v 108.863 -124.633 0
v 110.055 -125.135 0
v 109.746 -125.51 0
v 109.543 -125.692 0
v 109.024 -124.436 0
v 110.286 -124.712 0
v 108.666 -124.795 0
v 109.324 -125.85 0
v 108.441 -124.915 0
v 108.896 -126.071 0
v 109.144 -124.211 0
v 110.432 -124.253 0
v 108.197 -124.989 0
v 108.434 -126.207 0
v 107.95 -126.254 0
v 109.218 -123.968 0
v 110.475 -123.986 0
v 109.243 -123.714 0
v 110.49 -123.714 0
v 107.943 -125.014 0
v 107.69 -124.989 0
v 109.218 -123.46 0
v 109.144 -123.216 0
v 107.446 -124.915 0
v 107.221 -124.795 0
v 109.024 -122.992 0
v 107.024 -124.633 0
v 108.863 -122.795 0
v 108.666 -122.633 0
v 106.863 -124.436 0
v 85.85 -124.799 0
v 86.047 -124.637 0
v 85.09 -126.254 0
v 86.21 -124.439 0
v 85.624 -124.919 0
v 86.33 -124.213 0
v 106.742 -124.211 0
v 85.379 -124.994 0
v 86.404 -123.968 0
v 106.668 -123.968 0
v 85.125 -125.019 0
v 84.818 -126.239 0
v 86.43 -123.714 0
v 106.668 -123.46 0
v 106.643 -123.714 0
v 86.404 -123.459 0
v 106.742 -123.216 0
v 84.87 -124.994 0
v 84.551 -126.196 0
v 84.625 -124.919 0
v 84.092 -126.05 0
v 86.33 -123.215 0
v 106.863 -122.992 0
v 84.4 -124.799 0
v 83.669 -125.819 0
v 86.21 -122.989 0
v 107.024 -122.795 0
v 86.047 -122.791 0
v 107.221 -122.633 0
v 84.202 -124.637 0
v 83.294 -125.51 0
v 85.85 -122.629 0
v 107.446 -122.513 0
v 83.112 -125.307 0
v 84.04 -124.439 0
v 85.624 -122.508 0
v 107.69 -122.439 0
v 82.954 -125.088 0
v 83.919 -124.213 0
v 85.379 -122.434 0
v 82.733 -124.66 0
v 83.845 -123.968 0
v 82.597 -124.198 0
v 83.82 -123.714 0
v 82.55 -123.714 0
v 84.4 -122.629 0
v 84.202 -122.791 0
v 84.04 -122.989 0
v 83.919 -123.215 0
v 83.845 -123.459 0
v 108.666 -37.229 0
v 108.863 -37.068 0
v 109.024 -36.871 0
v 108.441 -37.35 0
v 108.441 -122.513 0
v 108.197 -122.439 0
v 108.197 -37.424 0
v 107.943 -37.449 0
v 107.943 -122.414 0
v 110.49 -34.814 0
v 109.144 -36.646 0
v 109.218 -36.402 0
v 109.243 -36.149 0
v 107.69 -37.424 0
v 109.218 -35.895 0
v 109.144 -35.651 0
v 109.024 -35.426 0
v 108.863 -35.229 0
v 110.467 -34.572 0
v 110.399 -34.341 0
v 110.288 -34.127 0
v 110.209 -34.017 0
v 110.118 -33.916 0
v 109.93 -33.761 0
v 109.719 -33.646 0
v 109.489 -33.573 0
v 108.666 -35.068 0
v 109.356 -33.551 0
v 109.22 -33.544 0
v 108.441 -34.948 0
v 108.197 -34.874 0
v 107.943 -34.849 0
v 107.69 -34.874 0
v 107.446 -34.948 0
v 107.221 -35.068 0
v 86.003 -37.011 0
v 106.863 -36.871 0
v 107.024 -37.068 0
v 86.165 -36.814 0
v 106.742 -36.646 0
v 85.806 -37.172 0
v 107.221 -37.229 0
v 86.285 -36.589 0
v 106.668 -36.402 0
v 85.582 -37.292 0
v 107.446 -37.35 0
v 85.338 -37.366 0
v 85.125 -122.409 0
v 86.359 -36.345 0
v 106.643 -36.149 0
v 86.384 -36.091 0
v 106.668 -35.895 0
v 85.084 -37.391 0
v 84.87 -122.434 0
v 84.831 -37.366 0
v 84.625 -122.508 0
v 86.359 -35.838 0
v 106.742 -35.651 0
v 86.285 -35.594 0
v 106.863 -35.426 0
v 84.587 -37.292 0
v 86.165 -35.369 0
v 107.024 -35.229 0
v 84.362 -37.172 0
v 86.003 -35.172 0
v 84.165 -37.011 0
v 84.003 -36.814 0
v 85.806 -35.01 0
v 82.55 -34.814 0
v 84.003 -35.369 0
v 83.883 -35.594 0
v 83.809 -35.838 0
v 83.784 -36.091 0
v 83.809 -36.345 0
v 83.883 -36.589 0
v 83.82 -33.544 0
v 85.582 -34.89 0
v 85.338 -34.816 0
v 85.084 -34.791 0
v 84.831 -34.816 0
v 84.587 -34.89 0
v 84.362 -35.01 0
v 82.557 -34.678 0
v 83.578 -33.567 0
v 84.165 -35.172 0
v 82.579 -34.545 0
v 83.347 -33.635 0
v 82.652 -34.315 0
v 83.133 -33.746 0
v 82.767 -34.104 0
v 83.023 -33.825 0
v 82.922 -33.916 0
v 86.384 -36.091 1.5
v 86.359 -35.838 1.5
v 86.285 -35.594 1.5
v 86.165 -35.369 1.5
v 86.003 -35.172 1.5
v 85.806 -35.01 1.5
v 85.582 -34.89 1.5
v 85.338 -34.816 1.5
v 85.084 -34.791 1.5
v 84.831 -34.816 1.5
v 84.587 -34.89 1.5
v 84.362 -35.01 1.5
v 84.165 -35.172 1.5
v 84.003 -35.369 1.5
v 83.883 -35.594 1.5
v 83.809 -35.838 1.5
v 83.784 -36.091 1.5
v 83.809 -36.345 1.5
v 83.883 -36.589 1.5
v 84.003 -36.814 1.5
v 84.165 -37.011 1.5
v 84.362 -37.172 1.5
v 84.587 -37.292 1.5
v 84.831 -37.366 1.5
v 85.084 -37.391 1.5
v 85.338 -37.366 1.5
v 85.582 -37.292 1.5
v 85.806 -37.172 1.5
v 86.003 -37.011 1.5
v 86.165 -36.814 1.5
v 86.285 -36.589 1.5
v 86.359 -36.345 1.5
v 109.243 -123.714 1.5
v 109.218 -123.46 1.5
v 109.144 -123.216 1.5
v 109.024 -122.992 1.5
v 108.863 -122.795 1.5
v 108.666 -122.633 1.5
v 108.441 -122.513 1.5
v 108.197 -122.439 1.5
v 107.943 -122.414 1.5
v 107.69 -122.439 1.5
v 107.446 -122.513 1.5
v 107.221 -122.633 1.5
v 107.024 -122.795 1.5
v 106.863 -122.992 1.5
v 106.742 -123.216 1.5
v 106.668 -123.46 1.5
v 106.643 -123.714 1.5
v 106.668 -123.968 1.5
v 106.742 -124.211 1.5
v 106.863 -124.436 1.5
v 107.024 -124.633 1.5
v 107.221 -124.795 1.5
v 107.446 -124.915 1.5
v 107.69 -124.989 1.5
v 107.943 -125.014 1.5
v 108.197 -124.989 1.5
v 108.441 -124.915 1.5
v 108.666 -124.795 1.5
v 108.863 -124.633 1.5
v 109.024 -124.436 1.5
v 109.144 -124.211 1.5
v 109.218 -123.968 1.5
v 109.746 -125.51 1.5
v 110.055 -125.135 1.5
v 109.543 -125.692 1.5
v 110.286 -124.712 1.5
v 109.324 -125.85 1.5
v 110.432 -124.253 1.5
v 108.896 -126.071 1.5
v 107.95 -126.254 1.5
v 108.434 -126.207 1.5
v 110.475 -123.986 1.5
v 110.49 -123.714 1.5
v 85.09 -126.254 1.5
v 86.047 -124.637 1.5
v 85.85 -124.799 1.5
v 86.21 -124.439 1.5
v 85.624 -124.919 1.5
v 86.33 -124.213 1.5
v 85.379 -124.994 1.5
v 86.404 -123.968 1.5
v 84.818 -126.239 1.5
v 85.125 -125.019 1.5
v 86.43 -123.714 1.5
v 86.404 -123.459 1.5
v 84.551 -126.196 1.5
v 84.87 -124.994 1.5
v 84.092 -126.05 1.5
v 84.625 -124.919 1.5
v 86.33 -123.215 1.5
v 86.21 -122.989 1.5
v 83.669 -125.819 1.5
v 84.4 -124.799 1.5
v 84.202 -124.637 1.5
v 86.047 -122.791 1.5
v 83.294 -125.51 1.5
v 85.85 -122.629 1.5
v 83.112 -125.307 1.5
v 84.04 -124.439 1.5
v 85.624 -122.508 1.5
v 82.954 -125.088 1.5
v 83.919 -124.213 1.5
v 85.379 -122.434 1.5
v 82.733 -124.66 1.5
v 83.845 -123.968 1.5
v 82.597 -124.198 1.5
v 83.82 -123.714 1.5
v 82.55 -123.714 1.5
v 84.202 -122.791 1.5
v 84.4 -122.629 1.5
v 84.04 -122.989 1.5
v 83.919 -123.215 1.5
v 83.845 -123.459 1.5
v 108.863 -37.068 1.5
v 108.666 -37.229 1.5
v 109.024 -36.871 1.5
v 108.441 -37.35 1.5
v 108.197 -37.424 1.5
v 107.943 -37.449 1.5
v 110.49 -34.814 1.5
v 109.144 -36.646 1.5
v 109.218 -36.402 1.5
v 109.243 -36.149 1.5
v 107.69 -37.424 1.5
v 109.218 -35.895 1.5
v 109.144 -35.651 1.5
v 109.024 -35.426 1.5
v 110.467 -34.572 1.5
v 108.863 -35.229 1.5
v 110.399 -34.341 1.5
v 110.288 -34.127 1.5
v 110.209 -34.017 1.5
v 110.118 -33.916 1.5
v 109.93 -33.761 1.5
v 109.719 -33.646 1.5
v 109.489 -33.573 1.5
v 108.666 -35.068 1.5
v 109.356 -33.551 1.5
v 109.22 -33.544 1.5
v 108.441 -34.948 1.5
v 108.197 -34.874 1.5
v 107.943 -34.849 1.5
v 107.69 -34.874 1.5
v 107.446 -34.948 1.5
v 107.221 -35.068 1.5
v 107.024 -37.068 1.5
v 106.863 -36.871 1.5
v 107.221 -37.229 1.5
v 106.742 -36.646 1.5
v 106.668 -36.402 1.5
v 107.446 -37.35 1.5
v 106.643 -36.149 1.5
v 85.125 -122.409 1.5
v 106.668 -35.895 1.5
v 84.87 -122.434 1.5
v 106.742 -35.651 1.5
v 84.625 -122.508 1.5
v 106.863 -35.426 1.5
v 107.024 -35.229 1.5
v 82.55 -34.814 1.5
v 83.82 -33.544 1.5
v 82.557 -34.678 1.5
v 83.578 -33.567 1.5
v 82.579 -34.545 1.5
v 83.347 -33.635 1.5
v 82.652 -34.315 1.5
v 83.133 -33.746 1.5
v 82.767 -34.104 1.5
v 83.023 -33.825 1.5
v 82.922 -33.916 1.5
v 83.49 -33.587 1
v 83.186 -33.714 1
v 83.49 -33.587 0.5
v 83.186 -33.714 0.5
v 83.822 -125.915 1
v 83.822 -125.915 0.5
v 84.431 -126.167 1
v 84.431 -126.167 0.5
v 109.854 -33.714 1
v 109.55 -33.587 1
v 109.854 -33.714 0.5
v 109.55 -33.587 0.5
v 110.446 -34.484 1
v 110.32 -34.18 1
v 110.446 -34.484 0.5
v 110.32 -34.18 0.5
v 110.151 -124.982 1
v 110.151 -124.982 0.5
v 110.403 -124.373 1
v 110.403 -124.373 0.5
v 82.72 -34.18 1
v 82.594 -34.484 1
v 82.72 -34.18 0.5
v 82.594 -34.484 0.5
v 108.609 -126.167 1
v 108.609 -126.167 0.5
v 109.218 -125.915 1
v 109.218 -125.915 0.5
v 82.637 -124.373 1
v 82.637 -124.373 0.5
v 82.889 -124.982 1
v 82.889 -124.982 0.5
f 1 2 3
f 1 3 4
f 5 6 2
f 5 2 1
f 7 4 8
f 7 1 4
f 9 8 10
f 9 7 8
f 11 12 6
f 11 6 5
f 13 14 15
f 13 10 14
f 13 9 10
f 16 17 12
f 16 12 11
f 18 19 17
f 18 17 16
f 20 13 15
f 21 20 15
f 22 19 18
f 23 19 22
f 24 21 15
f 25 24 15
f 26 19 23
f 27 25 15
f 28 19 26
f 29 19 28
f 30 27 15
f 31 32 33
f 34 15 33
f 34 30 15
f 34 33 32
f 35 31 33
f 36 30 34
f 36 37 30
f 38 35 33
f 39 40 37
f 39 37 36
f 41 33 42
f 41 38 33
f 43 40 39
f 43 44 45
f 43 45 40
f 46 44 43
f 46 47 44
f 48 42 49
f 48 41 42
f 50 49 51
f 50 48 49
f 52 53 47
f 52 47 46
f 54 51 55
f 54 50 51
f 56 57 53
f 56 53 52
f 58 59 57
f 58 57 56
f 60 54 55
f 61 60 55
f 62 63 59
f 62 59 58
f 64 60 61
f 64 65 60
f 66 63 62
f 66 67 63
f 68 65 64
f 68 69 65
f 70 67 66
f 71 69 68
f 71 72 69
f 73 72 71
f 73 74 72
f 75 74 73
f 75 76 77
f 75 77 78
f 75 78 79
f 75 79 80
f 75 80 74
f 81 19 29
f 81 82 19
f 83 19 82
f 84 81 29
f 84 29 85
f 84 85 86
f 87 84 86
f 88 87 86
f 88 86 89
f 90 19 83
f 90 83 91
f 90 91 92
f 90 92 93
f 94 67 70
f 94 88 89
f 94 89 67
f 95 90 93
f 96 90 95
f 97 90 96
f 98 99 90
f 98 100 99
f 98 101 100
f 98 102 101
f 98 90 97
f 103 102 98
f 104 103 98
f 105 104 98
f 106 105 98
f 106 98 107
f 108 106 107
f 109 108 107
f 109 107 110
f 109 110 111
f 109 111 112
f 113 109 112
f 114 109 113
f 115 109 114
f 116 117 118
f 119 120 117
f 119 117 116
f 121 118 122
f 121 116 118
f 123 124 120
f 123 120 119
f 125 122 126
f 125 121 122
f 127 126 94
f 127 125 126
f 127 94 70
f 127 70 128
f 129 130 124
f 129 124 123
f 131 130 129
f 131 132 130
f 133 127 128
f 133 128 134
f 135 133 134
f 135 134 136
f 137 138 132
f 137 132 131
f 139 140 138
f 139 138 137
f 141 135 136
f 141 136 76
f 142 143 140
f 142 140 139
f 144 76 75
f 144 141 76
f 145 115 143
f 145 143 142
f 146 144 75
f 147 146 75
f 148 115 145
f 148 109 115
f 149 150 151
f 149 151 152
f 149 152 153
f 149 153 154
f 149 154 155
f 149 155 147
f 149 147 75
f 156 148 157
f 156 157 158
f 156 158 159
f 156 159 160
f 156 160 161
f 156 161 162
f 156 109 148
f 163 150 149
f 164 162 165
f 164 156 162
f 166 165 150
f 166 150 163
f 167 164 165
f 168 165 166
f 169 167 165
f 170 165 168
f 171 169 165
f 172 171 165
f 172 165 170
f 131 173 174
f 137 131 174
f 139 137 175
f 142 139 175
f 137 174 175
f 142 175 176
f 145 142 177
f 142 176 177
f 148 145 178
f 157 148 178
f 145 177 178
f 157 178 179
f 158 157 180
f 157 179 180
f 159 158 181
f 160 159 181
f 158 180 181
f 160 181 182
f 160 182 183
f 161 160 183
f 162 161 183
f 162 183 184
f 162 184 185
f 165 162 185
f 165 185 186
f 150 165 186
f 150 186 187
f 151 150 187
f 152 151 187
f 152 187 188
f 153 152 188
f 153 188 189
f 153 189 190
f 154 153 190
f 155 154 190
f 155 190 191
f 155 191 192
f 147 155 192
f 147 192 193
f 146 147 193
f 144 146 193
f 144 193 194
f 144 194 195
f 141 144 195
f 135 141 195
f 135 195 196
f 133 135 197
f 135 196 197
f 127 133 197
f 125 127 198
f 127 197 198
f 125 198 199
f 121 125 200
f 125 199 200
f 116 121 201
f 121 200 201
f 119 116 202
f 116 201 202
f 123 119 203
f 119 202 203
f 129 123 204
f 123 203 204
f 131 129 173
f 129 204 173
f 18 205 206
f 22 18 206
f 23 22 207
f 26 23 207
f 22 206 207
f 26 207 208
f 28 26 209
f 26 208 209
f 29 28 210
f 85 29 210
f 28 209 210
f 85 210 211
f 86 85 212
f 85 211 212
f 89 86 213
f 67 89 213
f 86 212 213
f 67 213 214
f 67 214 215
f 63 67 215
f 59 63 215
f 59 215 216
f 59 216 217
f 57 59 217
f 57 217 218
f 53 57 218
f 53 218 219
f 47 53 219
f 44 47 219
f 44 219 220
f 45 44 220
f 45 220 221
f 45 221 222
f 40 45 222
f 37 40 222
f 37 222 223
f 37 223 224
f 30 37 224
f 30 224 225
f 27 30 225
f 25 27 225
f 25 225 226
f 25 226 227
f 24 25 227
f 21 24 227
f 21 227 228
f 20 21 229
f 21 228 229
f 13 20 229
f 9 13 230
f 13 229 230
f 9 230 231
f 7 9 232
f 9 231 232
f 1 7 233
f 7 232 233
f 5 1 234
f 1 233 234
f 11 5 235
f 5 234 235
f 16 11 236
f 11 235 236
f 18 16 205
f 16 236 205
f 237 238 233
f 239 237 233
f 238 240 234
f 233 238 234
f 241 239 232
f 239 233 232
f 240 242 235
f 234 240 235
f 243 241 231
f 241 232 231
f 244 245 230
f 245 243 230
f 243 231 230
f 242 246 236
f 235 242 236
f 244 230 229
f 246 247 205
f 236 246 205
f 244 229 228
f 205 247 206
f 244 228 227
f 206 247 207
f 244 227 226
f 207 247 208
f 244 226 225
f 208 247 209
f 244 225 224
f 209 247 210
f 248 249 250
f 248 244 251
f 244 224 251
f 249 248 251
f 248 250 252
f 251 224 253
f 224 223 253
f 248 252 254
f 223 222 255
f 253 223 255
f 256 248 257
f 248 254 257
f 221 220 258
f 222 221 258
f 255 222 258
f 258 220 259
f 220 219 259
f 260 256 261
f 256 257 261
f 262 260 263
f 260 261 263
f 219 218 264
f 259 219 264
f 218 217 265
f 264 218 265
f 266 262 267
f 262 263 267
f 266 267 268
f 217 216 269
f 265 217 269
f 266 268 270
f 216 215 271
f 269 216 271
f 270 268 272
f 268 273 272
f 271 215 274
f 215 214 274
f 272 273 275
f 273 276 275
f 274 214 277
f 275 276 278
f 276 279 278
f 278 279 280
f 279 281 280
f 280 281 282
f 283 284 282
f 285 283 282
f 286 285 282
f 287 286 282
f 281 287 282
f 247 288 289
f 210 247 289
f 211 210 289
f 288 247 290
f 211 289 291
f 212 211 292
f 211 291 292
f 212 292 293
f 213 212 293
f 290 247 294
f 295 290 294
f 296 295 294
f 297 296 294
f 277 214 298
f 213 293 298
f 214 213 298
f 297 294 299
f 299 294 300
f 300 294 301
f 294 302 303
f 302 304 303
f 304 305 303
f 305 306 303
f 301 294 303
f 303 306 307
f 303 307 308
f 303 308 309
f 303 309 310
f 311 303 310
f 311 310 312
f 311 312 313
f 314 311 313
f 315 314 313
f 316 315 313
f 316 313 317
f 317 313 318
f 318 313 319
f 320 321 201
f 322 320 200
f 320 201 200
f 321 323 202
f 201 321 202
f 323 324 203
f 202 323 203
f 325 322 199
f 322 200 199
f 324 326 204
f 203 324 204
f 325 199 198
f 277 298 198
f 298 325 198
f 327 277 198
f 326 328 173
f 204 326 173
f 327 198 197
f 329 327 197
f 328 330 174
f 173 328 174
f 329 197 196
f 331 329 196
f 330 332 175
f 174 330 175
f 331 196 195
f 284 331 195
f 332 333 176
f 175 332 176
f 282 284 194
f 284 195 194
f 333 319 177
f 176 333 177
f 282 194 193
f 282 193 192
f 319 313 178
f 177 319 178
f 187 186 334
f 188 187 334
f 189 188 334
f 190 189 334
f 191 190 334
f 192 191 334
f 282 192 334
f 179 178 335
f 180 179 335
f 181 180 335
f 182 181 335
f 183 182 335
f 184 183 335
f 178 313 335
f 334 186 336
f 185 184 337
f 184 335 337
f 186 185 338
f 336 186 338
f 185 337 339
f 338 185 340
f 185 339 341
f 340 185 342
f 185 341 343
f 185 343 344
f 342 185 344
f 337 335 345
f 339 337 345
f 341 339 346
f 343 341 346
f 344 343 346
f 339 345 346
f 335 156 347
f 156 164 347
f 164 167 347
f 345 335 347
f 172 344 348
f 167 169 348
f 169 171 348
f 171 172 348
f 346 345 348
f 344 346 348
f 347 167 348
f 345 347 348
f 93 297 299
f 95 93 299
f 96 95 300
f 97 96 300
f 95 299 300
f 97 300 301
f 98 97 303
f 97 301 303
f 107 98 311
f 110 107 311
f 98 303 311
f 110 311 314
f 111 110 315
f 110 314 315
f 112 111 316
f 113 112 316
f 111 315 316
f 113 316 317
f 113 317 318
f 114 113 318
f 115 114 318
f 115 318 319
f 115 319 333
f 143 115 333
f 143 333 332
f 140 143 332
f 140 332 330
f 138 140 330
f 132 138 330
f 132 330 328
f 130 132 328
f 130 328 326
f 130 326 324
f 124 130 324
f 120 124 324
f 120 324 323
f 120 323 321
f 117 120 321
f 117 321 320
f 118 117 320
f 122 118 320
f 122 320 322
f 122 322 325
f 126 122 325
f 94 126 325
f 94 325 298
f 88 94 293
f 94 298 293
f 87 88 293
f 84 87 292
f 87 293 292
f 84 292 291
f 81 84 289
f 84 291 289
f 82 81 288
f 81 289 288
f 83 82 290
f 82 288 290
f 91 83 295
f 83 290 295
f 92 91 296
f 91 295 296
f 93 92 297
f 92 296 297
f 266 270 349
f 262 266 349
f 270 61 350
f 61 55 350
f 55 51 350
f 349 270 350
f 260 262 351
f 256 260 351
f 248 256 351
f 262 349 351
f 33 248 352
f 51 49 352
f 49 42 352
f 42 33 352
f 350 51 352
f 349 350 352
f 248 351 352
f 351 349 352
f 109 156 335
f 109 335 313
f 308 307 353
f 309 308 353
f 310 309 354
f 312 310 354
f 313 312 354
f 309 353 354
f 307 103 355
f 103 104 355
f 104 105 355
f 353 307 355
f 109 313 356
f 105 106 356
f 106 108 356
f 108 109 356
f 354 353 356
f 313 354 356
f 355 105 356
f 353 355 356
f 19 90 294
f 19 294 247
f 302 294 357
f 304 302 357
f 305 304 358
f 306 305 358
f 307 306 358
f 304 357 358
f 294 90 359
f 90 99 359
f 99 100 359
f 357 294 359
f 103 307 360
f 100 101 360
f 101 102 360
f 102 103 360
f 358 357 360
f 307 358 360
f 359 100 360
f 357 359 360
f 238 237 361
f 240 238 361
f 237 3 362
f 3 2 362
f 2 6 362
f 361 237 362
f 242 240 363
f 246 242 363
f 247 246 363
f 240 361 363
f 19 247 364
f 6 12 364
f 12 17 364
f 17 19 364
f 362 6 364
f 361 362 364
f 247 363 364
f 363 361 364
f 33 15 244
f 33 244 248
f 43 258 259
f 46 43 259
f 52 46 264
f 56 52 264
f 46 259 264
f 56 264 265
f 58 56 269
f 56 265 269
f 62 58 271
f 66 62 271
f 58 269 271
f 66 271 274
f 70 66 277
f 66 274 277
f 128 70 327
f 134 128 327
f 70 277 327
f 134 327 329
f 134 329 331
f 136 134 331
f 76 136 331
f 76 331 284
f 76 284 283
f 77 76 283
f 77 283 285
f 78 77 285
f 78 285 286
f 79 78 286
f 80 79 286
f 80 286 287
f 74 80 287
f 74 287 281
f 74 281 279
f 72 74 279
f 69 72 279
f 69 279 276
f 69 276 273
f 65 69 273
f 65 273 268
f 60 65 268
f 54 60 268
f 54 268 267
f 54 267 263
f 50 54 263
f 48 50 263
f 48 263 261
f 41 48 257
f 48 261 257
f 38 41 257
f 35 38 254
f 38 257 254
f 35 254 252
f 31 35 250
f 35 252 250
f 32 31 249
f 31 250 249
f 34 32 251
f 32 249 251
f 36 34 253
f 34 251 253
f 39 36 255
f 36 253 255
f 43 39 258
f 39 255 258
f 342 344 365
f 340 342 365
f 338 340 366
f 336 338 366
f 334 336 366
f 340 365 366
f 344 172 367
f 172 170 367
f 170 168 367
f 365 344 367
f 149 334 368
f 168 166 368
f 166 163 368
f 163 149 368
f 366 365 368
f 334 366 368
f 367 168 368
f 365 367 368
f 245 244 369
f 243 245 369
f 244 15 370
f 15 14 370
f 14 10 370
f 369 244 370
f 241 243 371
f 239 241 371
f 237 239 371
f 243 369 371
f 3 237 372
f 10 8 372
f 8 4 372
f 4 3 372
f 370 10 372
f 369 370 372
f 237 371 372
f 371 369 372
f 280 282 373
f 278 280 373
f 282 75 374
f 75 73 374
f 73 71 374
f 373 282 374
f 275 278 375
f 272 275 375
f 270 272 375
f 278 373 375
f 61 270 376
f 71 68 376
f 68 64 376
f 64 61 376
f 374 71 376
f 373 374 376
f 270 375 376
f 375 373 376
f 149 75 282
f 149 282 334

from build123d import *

# Parameters (mm, degrees)
BOSS_EXTRU_1_DEPTH      = 1.5
ESQUISSE2_R             = 1.304771715
ESQUISSE2_R_2           = 1.27
ENL_V_MAT_EXTRU_1_DEPTH = 10
ESQUISSE3_R             = 1.3
ENL_V_MAT_EXTRU_2_DEPTH = 10


with BuildPart() as part:
    # Model → Boss.-Extru.1 (new body)
    with BuildSketch(Plane.XY):
        with BuildLine():
            Line((110.49, -34.813931), (110.49, -38.623931))
            Line((110.49, -38.623931), (110.49, -39.893931))
            Line((110.49, -39.893931), (110.49, -123.713931))
            add(Edge.make_bspline(
                [(109.746051, -125.509982), (110.222394, -125.03364), (110.49, -124.387581), (110.49, -123.713931)],
                knots=[0, 0, 0, 0, 1, 1, 1, 1], degree=3))
            add(Edge.make_bspline(
                [(107.95, -126.253931), (108.62365, -126.253931), (109.269709, -125.986325), (109.746051, -125.509982)],
                knots=[0, 0, 0, 0, 1, 1, 1, 1], degree=3))
            Line((107.95, -126.253931), (85.09, -126.253931))
            add(Edge.make_bspline(
                [(83.293949, -125.509982), (83.770291, -125.986325), (84.41635, -126.253931), (85.09, -126.253931)],
                knots=[0, 0, 0, 0, 1, 1, 1, 1], degree=3))
            add(Edge.make_bspline(
                [(82.55, -123.713931), (82.55, -124.387581), (82.817606, -125.03364), (83.293949, -125.509982)],
                knots=[0, 0, 0, 0, 1, 1, 1, 1], degree=3))
            Line((82.55, -123.713931), (82.55, -39.893931))
            Line((82.55, -39.893931), (82.55, -38.623931))
            Line((82.55, -38.623931), (82.55, -34.813931))
            add(Edge.make_bspline(
                [(82.921974, -33.915905), (82.683803, -34.154076), (82.55, -34.477106), (82.55, -34.813931)],
                knots=[0, 0, 0, 0, 1, 1, 1, 1], degree=3))
            add(Edge.make_bspline(
                [(83.82, -33.543931), (83.483175, -33.543931), (83.160146, -33.677734), (82.921974, -33.915905)],
                knots=[0, 0, 0, 0, 1, 1, 1, 1], degree=3))
            Line((83.82, -33.543931), (109.22, -33.543931))
            add(Edge.make_bspline(
                [(110.118026, -33.915905), (109.879854, -33.677734), (109.556825, -33.543931), (109.22, -33.543931)],
                knots=[0, 0, 0, 0, 1, 1, 1, 1], degree=3))
            add(Edge.make_bspline(
                [(110.49, -34.813931), (110.49, -34.477106), (110.356197, -34.154076), (110.118026, -33.915905)],
                knots=[0, 0, 0, 0, 1, 1, 1, 1], degree=3))
        make_face()
    extrude(amount=BOSS_EXTRU_1_DEPTH)

    # Esquisse2 → Enlèv. mat.-Extru.1 (cut)
    with BuildSketch(Plane.XY.offset(1.5)):
        with Locations((85.124771715, -123.713931)):
            Circle(ESQUISSE2_R)
        with Locations((122.913557923, -132.317690326)):
            Circle(ESQUISSE2_R_2)
    extrude(amount=-ENL_V_MAT_EXTRU_1_DEPTH, mode=Mode.SUBTRACT)

    # Esquisse3 → Enlèv. mat.-Extru.2 (cut)
    with BuildSketch(Plane.XY.offset(1.5)):
        with Locations((107.943434753, -36.148574536)):
            Circle(ESQUISSE3_R)
        with Locations((85.084137325, -36.091280874)):
            Circle(ESQUISSE3_R)
        with Locations((107.943434753, -123.713931)):
            Circle(ESQUISSE3_R)
    extrude(amount=-ENL_V_MAT_EXTRU_2_DEPTH, mode=Mode.SUBTRACT)


solid = part.part
